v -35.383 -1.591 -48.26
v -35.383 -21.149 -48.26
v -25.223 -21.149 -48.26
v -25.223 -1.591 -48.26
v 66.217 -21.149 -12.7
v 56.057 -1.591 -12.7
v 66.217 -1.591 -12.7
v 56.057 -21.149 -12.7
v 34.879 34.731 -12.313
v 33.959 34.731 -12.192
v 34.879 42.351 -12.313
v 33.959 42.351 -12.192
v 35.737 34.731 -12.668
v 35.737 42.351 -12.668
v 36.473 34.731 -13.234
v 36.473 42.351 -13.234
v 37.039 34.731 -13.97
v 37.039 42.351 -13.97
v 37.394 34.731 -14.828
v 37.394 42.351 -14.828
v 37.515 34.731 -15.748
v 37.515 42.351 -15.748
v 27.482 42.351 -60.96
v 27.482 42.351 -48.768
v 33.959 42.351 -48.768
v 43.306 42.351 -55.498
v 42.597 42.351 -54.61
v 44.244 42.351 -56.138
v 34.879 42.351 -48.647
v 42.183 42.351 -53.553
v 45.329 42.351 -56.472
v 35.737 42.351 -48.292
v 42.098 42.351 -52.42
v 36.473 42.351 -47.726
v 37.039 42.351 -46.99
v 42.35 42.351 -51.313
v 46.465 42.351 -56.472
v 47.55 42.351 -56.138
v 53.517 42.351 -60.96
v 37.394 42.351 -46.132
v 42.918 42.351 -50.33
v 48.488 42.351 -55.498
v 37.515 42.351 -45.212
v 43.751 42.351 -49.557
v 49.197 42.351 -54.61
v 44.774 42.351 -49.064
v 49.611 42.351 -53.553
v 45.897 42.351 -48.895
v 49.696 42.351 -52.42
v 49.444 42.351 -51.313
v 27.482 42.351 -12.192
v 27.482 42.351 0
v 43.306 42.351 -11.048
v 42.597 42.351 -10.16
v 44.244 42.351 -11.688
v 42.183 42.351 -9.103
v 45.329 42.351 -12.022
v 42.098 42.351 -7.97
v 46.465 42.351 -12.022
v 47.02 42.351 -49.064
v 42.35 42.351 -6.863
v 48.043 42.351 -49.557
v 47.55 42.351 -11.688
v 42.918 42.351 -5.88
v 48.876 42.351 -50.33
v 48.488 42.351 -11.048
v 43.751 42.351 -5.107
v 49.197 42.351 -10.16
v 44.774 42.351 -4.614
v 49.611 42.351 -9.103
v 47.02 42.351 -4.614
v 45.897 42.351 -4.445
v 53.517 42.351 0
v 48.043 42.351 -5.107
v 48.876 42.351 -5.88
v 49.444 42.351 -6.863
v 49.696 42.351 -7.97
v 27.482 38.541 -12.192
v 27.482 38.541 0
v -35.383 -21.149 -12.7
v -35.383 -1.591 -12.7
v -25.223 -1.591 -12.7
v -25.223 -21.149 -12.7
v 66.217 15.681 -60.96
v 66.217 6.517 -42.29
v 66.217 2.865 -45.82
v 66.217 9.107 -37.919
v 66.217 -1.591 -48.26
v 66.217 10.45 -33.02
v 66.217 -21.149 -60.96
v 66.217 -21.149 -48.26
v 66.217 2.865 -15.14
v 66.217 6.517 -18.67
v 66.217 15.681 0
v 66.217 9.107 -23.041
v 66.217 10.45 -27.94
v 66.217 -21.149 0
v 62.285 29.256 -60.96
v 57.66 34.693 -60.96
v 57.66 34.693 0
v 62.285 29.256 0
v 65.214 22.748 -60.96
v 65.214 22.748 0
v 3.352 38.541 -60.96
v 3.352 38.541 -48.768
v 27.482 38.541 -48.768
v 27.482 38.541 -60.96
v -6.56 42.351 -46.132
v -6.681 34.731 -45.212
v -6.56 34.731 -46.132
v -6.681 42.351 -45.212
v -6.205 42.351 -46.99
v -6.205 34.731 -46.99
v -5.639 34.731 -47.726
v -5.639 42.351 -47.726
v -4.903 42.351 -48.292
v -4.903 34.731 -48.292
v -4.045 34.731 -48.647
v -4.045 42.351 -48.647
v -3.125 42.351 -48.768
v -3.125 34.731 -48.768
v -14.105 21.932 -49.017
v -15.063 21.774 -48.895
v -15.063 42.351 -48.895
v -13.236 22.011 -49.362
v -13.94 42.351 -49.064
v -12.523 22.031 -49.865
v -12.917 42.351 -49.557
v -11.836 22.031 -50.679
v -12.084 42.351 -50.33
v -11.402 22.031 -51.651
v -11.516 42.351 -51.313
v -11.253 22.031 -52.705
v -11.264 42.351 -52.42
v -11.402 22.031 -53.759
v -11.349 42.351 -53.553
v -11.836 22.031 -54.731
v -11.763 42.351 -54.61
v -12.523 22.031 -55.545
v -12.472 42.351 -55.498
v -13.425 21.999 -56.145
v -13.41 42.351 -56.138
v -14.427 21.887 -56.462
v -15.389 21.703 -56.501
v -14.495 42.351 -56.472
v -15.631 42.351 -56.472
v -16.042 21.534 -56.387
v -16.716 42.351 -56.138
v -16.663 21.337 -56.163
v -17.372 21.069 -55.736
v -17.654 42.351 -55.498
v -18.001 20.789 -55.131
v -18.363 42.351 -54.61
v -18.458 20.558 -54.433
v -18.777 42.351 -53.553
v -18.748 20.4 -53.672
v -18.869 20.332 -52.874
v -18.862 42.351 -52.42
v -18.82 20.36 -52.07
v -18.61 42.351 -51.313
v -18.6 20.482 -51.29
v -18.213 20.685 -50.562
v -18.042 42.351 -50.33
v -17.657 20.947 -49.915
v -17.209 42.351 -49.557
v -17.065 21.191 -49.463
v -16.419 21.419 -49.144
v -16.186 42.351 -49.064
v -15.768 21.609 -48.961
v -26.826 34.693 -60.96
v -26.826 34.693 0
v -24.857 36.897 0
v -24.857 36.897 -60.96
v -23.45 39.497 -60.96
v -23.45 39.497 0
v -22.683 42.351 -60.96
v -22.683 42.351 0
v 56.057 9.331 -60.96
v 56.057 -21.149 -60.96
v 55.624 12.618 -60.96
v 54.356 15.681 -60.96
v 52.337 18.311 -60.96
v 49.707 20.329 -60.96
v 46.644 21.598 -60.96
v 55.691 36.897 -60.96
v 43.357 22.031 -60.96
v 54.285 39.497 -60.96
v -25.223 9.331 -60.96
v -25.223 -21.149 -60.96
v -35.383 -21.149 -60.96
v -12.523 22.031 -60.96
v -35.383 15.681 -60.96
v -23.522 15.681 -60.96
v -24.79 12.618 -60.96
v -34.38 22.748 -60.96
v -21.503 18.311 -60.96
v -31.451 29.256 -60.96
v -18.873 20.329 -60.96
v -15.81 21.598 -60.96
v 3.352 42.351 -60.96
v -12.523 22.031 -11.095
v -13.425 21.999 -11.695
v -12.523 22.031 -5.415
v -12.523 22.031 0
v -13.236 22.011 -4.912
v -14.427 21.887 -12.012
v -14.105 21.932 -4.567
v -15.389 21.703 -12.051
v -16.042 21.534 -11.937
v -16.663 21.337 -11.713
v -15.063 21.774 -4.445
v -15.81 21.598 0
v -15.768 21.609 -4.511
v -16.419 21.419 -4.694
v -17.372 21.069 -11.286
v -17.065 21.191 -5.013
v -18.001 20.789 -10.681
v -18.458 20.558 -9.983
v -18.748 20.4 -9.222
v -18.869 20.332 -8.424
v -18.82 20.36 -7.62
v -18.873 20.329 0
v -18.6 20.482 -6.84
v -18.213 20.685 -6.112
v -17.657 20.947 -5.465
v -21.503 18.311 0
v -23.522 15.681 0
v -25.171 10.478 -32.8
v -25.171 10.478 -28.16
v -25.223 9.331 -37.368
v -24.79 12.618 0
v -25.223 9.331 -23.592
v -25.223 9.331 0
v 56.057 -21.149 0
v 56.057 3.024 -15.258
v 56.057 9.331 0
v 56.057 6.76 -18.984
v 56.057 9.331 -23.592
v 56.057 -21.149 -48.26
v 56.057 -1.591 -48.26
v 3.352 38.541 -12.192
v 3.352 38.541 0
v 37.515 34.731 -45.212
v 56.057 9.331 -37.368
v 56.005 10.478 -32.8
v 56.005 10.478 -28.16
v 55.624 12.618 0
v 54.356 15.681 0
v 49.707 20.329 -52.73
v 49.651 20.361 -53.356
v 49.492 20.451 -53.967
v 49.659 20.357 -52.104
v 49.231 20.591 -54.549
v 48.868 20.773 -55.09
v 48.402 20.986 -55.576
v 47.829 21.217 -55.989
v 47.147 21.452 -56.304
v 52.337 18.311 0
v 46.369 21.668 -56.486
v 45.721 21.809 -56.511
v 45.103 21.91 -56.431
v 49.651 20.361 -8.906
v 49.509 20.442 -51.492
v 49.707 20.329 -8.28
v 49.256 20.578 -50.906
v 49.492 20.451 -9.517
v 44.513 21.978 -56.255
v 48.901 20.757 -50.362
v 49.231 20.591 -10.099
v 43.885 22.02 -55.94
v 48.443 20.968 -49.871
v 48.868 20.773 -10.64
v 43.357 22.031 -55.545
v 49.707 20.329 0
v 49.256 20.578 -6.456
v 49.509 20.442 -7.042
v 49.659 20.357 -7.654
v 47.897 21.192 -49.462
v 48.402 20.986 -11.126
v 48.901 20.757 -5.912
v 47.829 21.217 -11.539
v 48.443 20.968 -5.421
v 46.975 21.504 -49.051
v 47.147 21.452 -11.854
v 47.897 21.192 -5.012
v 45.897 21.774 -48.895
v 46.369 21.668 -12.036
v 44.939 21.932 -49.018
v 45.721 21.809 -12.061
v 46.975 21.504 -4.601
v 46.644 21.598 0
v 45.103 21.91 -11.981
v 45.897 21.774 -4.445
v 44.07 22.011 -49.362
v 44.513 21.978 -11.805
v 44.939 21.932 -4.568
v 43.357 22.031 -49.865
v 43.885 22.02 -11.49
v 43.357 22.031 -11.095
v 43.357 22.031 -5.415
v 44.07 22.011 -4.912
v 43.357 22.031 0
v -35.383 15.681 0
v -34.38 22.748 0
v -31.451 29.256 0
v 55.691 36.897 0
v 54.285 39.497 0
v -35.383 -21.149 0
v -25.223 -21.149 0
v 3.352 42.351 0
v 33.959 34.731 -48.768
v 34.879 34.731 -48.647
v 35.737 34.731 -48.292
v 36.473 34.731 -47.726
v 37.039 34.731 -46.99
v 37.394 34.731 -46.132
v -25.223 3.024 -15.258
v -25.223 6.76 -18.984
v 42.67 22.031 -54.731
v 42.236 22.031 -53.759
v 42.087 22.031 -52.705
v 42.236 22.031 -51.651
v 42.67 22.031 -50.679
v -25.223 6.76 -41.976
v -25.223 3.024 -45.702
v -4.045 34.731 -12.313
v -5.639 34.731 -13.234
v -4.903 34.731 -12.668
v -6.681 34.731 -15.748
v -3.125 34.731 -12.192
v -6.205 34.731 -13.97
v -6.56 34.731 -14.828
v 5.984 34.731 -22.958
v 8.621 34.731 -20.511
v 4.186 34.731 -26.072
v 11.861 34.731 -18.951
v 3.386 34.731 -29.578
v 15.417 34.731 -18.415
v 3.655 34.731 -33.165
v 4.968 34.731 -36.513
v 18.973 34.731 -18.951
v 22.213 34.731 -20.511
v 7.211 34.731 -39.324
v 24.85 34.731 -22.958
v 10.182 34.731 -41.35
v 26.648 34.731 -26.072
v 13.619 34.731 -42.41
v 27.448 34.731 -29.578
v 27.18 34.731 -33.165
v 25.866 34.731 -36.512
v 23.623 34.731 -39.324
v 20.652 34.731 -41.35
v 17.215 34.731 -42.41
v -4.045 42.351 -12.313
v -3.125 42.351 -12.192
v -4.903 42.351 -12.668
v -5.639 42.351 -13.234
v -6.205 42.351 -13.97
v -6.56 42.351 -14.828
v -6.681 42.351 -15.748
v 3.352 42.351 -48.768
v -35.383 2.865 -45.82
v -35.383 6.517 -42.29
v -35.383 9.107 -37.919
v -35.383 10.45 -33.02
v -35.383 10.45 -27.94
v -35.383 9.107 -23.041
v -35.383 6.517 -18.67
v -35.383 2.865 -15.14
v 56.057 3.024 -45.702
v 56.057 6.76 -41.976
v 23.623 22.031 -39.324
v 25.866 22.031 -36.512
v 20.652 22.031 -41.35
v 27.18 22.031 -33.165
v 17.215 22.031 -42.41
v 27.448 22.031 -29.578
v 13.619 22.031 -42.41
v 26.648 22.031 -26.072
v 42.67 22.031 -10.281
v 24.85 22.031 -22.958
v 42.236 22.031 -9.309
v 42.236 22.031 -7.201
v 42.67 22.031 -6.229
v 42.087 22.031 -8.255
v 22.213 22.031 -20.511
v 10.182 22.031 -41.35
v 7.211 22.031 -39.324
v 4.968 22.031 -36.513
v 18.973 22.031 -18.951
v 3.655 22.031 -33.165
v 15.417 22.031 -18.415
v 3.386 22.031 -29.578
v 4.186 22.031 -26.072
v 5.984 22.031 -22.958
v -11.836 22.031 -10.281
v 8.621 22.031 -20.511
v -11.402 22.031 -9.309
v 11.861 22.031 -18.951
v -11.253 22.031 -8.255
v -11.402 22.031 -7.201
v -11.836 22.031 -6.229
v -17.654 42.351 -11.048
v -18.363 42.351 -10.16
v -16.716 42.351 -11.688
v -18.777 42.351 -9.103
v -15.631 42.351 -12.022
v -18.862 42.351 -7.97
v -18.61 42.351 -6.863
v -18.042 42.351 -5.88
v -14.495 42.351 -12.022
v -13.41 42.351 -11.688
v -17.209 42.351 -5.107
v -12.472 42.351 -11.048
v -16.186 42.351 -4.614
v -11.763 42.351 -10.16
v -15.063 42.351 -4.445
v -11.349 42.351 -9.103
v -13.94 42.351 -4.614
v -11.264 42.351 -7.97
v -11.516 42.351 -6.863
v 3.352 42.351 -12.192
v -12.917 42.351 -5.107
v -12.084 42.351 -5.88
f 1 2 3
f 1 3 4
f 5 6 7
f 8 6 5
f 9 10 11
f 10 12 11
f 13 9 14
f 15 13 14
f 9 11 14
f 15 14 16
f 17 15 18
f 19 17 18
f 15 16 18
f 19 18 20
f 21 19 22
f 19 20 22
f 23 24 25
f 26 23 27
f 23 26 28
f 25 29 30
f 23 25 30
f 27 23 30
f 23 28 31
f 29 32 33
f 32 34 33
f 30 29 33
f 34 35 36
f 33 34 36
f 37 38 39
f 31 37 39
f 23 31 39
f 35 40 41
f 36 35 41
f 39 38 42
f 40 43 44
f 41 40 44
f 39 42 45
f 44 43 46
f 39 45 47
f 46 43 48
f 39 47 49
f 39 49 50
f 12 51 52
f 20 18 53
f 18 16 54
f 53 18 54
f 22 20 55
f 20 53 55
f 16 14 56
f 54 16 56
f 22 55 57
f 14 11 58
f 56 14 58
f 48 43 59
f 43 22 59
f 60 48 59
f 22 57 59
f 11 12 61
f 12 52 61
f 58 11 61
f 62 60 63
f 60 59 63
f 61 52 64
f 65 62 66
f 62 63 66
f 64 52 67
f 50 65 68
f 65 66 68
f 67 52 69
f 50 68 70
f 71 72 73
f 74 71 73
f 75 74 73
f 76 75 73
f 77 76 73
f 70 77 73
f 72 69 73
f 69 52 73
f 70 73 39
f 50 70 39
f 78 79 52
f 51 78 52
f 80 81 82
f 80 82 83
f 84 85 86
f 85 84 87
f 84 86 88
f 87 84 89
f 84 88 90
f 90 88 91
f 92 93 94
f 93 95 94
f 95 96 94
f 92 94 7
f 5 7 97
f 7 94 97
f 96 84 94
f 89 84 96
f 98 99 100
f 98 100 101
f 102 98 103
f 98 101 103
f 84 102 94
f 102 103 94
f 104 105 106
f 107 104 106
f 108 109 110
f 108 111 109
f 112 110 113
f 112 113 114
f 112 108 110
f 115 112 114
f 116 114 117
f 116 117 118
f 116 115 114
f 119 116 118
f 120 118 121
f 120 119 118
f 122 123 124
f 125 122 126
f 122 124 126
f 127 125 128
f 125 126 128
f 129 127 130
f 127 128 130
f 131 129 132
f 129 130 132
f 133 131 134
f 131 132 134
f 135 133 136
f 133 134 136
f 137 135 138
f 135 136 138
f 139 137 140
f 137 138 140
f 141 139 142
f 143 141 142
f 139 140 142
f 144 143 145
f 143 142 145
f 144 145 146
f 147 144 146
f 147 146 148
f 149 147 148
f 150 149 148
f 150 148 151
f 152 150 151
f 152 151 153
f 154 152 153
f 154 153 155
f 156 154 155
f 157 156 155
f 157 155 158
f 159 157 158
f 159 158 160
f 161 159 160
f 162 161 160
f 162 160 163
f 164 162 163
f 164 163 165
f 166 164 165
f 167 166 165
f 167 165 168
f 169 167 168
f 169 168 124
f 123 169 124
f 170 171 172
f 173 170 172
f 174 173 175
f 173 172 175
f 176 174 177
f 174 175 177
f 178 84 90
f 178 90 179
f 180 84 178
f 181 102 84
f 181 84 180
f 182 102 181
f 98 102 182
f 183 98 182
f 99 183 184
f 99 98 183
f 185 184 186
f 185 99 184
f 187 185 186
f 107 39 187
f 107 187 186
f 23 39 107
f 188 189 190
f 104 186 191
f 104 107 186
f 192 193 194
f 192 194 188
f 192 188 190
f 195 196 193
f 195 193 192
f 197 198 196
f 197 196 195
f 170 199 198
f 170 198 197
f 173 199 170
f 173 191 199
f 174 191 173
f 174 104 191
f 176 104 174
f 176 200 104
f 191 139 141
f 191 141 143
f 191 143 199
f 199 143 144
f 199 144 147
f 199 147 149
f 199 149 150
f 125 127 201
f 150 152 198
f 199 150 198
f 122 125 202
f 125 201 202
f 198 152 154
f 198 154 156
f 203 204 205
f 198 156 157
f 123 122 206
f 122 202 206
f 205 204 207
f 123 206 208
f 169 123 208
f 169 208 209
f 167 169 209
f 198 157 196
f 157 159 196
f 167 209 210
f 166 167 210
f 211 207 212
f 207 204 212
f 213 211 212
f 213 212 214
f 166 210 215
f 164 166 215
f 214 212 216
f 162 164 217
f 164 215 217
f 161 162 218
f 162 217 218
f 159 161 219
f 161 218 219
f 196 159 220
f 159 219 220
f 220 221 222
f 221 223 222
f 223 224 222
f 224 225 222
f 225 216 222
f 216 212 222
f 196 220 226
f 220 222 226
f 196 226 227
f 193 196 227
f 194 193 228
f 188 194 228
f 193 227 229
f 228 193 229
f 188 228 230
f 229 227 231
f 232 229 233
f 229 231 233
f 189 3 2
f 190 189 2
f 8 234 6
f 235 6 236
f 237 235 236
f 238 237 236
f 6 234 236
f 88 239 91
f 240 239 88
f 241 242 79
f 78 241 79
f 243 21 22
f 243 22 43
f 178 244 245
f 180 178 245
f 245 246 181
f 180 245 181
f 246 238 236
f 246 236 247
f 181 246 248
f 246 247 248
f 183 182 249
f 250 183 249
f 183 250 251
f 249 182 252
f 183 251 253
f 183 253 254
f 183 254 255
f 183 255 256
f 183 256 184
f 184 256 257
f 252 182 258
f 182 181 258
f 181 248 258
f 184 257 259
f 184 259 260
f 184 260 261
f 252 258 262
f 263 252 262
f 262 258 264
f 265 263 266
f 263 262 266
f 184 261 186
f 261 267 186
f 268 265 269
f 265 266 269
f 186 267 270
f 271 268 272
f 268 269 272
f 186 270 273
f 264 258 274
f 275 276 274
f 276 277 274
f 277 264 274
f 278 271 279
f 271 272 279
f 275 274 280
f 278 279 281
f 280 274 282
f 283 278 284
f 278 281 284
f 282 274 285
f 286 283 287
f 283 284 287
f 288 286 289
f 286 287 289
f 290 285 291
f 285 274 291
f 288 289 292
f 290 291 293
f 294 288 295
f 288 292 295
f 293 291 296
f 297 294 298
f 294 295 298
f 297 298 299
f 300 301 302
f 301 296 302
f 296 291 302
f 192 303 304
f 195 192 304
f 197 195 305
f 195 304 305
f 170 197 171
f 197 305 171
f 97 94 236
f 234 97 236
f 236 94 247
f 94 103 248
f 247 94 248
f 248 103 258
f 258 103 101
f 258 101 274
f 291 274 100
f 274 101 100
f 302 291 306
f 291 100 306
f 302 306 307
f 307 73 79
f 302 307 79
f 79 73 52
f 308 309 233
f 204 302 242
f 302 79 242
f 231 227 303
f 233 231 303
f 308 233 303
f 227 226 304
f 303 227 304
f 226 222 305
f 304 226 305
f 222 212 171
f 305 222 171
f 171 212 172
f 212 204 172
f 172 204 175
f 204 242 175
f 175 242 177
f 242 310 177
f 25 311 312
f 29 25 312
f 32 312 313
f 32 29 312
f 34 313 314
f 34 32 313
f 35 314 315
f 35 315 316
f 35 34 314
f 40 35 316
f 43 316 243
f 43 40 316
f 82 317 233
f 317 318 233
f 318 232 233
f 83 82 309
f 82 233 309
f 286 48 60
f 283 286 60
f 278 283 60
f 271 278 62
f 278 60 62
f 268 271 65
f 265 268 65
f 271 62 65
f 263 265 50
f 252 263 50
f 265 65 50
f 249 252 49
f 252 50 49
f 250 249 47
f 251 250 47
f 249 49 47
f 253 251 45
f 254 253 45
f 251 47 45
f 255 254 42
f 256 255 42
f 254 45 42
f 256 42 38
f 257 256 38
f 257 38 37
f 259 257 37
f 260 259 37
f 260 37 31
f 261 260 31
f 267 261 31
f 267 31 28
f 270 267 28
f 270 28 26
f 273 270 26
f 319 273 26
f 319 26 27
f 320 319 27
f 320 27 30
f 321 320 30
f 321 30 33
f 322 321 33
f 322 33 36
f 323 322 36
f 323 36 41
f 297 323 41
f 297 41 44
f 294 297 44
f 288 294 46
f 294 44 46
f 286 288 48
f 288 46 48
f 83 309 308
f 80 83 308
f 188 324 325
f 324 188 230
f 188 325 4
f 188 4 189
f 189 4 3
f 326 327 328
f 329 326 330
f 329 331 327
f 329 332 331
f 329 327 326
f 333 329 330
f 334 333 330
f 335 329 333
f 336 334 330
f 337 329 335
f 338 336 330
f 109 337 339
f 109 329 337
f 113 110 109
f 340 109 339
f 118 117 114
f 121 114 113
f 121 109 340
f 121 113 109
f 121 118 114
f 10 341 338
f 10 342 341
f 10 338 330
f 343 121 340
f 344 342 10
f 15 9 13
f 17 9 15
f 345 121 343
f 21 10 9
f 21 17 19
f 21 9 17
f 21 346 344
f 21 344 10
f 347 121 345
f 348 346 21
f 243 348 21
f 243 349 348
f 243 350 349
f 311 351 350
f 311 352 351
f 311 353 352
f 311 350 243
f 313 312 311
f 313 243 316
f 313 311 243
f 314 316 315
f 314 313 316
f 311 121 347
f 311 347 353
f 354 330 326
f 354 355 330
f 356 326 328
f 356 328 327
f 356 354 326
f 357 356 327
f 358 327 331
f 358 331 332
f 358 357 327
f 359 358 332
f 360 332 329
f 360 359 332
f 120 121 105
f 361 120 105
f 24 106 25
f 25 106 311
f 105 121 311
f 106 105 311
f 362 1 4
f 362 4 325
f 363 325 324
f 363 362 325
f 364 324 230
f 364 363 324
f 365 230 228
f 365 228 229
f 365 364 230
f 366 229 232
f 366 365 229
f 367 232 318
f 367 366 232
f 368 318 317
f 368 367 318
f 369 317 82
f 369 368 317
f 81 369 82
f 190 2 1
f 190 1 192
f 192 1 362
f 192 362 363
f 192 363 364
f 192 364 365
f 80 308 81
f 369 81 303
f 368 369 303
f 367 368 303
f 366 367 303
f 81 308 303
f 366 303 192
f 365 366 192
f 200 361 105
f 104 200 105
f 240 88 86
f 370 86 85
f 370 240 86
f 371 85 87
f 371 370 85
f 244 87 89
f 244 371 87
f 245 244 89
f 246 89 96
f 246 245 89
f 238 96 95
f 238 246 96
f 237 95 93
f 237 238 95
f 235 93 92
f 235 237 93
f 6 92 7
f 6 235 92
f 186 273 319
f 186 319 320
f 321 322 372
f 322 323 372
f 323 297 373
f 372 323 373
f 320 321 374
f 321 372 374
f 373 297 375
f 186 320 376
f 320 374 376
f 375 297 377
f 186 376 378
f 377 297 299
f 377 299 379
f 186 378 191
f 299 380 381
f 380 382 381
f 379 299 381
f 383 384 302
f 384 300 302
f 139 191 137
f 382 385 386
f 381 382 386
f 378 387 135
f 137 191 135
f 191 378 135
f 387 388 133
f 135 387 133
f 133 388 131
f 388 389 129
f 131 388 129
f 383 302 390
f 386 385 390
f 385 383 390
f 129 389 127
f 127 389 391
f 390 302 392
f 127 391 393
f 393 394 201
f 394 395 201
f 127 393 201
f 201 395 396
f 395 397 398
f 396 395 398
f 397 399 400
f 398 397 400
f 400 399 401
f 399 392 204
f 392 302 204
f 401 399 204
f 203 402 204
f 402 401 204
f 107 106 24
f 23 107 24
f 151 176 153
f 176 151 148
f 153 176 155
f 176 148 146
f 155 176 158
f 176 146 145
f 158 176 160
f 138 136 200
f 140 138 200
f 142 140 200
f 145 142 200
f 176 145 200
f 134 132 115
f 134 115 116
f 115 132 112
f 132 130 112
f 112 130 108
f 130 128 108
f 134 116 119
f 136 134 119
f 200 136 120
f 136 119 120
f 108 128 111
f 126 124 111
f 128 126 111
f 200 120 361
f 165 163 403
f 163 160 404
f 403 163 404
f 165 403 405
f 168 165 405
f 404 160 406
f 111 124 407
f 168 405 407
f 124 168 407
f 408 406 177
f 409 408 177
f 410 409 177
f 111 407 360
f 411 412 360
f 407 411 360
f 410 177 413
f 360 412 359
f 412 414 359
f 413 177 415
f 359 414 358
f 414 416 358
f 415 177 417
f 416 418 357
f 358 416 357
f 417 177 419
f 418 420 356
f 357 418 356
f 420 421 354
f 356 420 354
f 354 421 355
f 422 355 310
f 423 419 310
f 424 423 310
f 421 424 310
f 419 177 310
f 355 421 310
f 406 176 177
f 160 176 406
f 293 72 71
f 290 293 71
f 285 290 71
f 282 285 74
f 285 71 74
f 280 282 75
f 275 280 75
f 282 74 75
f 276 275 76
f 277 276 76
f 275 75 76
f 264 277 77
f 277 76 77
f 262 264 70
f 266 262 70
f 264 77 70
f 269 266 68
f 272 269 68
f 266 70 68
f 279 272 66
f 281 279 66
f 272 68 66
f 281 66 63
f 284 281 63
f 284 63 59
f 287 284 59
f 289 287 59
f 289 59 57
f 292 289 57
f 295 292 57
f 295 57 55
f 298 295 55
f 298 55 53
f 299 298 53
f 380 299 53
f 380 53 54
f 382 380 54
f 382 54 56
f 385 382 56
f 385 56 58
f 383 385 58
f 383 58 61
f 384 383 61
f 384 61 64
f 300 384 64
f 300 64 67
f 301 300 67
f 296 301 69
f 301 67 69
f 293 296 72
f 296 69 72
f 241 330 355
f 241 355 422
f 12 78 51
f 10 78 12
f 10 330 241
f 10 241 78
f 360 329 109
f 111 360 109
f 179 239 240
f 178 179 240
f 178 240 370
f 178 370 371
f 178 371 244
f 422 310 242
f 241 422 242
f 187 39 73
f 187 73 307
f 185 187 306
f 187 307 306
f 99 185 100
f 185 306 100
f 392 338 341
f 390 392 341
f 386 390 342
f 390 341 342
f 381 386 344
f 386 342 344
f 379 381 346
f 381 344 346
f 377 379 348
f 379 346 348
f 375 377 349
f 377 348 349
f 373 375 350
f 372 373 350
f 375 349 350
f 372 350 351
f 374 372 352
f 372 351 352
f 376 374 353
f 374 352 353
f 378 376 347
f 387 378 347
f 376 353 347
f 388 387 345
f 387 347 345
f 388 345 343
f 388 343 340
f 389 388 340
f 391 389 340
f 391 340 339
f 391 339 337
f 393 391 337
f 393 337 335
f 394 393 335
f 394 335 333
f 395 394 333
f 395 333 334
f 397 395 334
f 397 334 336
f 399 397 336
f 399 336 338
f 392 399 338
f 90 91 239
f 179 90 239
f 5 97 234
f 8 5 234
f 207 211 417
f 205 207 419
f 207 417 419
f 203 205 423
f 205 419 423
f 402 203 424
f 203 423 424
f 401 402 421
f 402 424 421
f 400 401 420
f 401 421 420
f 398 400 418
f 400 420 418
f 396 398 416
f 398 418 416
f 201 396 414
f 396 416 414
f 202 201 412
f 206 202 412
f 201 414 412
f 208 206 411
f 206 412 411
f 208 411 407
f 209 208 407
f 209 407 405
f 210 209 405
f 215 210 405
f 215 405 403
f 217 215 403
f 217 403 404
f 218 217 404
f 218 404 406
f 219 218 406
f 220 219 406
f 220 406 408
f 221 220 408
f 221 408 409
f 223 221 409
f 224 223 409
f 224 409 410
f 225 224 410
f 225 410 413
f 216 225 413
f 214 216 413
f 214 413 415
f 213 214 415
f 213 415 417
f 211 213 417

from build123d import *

# Parameters (mm, degrees)
BOSS_EXTRUDE1_DEPTH     = 60.96
CUT_EXTRUDE1_DEPTH      = 3.81
CUT_EXTRUDE1_DEPTH_BACK = 3.81
SKETCH4_W               = 44.196
SKETCH4_H               = 36.576
SKETCH6_R               = 12.065
SKETCH6_R_2             = 3.81
CUT_EXTRUDE2_DEPTH      = 40.64
CUT_EXTRUDE4_DEPTH      = 126.82636128
CUT_EXTRUDE4_DEPTH_BACK = 126.82636128
FILLET1_R               = 3.556


with BuildPart() as part:
    # Sketch2 → Boss-Extrude1 (new body)
    with BuildSketch(Plane.XY):
        with BuildLine():
            Line((-35.382985005, -21.149184515), (-35.382985005, 15.680815485))
            ThreePointArc((-35.382985005, 15.680815485), (-33.145202484, 26.105386529), (-26.826159694, 34.693113252))
            ThreePointArc((-26.826159694, 34.693113252), (-24.077840328, 38.155820727), (-22.682985005, 42.350815485))
            Line((-22.682985005, 42.350815485), (3.352014995, 42.350815485))
            Line((3.352014995, 42.350815485), (3.352014995, 38.540815485))
            Line((3.352014995, 38.540815485), (27.482014995, 38.540815485))
            Line((27.482014995, 38.540815485), (27.482014995, 42.350815485))
            Line((27.482014995, 42.350815485), (53.517014995, 42.350815485))
            ThreePointArc((53.517014995, 42.350815485), (54.911870318, 38.155820727), (57.660189685, 34.693113252))
            ThreePointArc((57.660189685, 34.693113252), (63.979232475, 26.105386529), (66.217014995, 15.680815485))
            Line((66.217014995, 15.680815485), (66.217014995, -21.149184515))
            Line((66.217014995, -21.149184515), (56.057014995, -21.149184515))
            Line((56.057014995, -21.149184515), (56.057014995, 9.330815485))
            ThreePointArc((56.057014995, 9.330815485), (52.337271116, 18.311071606), (43.357014995, 22.030815485))
            Line((43.357014995, 22.030815485), (-12.522985005, 22.030815485))
            ThreePointArc((-12.522985005, 22.030815485), (-21.503241126, 18.311071606), (-25.222985005, 9.330815485))
            Line((-25.222985005, 9.330815485), (-25.222985005, -21.149184515))
            Line((-25.222985005, -21.149184515), (-35.382985005, -21.149184515))
        make_face()
    extrude(amount=-BOSS_EXTRUDE1_DEPTH)

    # Sketch4 → Cut-Extrude1 (cut, two sides: drawn at the far end of the back side and taken through both)
    with BuildSketch(Plane(origin=(0, 38.540815485, 0), x_dir=(1, 0, 0), z_dir=(0, 1, 0)).offset(-CUT_EXTRUDE1_DEPTH_BACK)):
        with Locations((15.417014995, 30.48)):
            Rectangle(SKETCH4_W, SKETCH4_H)
    extrude(amount=CUT_EXTRUDE1_DEPTH + CUT_EXTRUDE1_DEPTH_BACK, mode=Mode.SUBTRACT)

    # Sketch6 → Cut-Extrude2 (cut)
    with BuildSketch(Plane(origin=(0, 42.350815485, 0), x_dir=(1, 0, 0), z_dir=(0, 1, 0))):
        with Locations(Location((15.417014995, 30.48, 0), (0, 0, 270))):
            Circle(SKETCH6_R)
        with Locations(Location((-15.062985005, 8.255, 0), (0, 0, 270))):
            Circle(SKETCH6_R_2)
        with Locations(Location((-15.062985005, 52.705, 0), (0, 0, 270))):
            Circle(SKETCH6_R_2)
        with Locations(Location((45.897014995, 52.705, 0), (0, 0, 270))):
            Circle(SKETCH6_R_2)
        with Locations(Location((45.897014995, 8.255, 0), (0, 0, 270))):
            Circle(SKETCH6_R_2)
    extrude(amount=-CUT_EXTRUDE2_DEPTH, mode=Mode.SUBTRACT)

    # Sketch7 → Cut-Extrude4 (cut, two sides: drawn at the far end of the back side and taken through both)
    with BuildSketch(Plane(origin=(66.217014995, 0, 0), x_dir=(0, 0, -1), z_dir=(1, 0, 0)).offset(-CUT_EXTRUDE4_DEPTH_BACK)):
        with BuildLine():
            Line((12.7, -1.591184515), (12.7, -21.149184515))
            Line((12.7, -21.149184515), (48.26, -21.149184515))
            Line((48.26, -21.149184515), (48.26, -1.591184515))
            ThreePointArc((48.26, -1.591184515), (30.48, 10.61965618), (12.7, -1.591184515))
        make_face()
    extrude(amount=CUT_EXTRUDE4_DEPTH + CUT_EXTRUDE4_DEPTH_BACK, mode=Mode.SUBTRACT)

    # Fillet1
    fillet1_edges = [part.edges().sort_by_distance(p)[0] for p in [
        (37.515014995, 38.540815485, -12.192),
        (37.515014995, 38.540815485, -48.768),
        (-6.680985005, 38.540815485, -48.768),
        (-6.680985005, 38.540815485, -12.192),
    ]]
    fillet(fillet1_edges, radius=FILLET1_R)


solid = part.part
